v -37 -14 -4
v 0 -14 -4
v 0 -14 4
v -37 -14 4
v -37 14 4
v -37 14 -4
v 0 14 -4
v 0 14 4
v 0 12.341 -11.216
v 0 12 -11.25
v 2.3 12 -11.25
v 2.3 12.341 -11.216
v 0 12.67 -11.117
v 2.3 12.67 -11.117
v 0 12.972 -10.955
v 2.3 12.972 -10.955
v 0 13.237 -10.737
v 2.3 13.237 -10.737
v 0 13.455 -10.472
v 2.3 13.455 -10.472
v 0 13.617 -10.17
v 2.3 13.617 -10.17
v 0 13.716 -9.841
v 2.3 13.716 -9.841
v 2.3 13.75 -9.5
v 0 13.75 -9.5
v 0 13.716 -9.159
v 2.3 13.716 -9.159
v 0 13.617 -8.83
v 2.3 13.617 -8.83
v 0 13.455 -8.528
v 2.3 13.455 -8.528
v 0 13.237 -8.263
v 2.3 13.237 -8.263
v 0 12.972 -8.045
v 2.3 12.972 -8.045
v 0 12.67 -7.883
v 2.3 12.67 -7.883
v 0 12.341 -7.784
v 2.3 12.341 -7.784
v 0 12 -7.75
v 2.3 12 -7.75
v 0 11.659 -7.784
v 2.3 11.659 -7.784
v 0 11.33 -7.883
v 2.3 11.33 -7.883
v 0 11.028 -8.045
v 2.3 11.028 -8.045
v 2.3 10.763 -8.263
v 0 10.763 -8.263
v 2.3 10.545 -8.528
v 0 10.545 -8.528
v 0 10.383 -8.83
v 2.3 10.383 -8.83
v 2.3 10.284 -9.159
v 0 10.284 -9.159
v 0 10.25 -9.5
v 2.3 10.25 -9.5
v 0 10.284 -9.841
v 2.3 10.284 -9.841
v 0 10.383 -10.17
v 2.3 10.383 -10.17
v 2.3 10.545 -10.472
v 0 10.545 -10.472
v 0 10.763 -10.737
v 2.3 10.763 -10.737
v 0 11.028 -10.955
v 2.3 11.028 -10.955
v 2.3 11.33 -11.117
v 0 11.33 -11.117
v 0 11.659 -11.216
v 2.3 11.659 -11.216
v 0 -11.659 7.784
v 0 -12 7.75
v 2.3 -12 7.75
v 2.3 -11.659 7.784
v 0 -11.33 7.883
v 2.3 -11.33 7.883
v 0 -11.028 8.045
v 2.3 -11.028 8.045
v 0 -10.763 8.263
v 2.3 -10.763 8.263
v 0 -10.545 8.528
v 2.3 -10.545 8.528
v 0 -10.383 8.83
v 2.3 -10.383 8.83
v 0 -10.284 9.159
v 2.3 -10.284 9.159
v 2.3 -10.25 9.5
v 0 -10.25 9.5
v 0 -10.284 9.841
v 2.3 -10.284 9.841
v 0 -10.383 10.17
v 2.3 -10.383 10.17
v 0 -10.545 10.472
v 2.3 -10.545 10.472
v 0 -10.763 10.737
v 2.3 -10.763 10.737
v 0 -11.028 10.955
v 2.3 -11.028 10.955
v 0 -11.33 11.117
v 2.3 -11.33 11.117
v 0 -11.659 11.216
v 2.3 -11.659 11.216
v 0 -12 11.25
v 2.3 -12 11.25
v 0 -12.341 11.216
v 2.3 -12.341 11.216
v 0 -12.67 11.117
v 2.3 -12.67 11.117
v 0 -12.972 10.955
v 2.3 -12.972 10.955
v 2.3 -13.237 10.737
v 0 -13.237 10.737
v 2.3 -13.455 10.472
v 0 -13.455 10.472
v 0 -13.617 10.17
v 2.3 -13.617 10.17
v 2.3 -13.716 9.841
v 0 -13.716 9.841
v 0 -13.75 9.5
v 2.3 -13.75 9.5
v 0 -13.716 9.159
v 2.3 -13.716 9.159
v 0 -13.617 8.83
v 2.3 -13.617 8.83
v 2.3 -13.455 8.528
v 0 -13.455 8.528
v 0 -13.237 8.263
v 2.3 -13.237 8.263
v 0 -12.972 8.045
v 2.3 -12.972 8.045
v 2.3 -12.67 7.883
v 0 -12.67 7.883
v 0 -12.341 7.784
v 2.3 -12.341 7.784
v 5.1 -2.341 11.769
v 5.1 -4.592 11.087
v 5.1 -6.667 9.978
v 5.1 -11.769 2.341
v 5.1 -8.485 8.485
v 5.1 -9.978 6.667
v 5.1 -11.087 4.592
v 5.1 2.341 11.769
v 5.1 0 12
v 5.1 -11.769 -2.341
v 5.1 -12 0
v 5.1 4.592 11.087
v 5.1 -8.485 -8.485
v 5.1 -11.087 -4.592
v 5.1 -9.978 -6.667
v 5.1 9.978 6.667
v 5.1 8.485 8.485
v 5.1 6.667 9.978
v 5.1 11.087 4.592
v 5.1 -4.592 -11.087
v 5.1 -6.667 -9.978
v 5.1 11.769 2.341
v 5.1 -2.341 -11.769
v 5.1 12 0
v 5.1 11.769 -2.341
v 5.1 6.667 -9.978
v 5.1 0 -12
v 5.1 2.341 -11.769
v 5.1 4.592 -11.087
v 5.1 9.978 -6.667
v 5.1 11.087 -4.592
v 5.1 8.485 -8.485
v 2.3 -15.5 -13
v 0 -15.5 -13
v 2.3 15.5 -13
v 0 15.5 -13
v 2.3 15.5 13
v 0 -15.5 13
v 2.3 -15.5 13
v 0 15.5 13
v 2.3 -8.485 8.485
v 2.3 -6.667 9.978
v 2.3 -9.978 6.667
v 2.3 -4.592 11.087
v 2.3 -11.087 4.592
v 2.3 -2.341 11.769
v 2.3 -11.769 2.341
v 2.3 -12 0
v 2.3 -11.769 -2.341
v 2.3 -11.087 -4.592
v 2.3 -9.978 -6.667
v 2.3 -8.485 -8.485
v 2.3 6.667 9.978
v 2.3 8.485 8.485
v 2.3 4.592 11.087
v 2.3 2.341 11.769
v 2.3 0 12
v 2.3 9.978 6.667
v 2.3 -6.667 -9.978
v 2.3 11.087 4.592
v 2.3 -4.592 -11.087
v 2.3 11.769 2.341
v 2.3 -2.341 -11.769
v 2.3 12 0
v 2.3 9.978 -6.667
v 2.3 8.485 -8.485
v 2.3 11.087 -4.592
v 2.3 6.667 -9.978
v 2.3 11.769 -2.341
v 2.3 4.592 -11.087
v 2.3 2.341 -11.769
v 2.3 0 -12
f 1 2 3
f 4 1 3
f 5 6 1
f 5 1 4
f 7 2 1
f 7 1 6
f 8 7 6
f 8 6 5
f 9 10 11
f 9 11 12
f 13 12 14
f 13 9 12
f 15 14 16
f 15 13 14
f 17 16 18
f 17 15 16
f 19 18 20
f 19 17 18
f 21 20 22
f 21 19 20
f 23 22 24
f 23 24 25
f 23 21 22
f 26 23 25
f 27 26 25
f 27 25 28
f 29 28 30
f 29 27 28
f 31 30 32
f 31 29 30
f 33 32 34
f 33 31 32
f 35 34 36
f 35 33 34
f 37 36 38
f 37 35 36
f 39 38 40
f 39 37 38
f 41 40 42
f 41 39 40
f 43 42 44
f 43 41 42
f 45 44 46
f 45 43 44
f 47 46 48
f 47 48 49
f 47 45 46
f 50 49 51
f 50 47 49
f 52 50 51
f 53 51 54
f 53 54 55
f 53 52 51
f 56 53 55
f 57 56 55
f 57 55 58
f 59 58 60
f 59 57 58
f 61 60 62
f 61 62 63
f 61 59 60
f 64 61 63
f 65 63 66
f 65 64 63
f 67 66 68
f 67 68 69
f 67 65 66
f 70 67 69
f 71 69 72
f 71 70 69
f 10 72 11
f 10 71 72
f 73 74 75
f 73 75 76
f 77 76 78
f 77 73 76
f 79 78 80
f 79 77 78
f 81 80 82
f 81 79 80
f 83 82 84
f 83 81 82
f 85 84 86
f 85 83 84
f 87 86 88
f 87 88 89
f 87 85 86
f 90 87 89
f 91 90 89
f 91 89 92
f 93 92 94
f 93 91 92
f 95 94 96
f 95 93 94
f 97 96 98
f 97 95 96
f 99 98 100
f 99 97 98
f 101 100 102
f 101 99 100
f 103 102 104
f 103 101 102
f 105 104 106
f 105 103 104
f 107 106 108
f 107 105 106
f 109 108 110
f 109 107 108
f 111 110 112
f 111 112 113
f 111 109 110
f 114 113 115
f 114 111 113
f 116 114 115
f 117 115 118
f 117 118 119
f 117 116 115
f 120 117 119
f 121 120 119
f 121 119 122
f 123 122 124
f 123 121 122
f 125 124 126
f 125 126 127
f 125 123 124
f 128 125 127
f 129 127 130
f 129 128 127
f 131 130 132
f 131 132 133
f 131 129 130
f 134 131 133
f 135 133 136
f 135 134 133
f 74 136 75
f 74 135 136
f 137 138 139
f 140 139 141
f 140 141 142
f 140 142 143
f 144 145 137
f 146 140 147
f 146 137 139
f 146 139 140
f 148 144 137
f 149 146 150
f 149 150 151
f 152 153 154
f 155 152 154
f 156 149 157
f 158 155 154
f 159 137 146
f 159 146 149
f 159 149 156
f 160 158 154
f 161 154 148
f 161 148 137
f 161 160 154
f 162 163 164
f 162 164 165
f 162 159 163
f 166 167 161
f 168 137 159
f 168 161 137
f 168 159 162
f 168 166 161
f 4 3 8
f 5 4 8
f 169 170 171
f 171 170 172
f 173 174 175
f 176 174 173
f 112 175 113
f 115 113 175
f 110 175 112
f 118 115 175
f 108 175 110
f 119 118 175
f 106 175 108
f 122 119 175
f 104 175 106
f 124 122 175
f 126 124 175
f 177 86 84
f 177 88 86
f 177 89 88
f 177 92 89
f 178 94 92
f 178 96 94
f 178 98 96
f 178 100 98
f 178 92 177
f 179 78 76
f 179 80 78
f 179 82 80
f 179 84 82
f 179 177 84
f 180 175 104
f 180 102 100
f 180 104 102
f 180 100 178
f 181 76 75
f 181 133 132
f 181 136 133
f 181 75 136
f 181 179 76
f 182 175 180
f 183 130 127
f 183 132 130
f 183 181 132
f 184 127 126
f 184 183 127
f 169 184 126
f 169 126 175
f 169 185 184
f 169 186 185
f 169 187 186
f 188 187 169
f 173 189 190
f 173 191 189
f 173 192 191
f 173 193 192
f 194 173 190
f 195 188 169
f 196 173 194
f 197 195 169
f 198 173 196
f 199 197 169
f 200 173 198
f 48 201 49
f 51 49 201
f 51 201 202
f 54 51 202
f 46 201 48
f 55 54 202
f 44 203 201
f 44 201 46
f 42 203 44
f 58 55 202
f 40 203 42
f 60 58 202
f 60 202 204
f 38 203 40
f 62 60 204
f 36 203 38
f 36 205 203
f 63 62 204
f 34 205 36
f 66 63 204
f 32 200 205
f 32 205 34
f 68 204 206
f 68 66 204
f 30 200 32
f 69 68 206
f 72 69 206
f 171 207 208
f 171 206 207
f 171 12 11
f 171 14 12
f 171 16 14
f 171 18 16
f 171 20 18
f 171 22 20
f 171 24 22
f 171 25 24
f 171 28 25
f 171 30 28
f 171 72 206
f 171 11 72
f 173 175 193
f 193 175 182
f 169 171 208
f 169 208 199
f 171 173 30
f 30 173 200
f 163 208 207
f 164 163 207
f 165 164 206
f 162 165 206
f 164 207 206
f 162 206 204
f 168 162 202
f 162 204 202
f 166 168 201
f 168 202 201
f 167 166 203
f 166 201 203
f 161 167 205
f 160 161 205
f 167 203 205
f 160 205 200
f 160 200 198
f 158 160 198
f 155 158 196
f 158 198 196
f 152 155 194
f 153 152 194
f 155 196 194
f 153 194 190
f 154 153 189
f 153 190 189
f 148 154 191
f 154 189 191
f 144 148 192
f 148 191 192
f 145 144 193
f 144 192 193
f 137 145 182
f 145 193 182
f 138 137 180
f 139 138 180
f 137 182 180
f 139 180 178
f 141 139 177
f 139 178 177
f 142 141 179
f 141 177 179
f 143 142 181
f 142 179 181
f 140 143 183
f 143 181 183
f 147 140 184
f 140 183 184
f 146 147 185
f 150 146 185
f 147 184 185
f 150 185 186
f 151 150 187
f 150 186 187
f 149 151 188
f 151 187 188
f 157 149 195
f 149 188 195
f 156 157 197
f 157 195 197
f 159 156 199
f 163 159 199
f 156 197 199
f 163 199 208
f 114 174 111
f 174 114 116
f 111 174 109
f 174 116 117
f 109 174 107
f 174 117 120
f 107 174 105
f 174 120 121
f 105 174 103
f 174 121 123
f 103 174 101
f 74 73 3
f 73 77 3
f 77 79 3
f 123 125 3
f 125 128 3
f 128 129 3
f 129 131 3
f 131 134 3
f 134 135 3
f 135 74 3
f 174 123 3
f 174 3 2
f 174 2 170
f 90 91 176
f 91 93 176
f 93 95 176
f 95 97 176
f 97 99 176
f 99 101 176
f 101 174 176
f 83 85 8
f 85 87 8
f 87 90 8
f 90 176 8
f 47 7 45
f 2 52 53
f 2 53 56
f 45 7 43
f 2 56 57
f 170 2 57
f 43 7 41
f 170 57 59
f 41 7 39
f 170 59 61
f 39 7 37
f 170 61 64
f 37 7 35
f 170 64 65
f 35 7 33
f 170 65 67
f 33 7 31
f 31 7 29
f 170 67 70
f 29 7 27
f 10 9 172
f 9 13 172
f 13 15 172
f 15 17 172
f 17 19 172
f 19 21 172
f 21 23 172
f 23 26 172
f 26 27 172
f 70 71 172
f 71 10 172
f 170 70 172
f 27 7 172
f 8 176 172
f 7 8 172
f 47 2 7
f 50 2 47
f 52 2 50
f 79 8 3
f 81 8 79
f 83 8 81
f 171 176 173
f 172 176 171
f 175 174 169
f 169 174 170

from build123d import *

# Parameters (mm, degrees)
SKETCH2_W           = 26
SKETCH2_H           = 31
SKETCH2_R           = 1.75
BOSS_EXTRUDE1_DEPTH = 2.3
SKETCH3_R           = 12
BOSS_EXTRUDE2_DEPTH = 2.8
SKETCH4_W           = 8
SKETCH4_H           = 28
BOSS_EXTRUDE3_DEPTH = 37


with BuildPart() as part:
    # Sketch2 → Boss-Extrude1 (new body)
    with BuildSketch(Plane(origin=(0, 0, 0), x_dir=(0, 0, -1), z_dir=(1, 0, 0))):
        Rectangle(SKETCH2_W, SKETCH2_H)
        with Locations((-9.5, -12)):
            Circle(SKETCH2_R, mode=Mode.SUBTRACT)
        with Locations((9.5, 12)):
            Circle(SKETCH2_R, mode=Mode.SUBTRACT)
    extrude(amount=BOSS_EXTRUDE1_DEPTH)

    # Sketch3 → Boss-Extrude2 (add)
    with BuildSketch(Plane(origin=(2.3, 0, 0), x_dir=(0, 0, -1), z_dir=(1, 0, 0))):
        Circle(SKETCH3_R)
    extrude(amount=BOSS_EXTRUDE2_DEPTH)

    # Sketch4 → Boss-Extrude3 (add)
    with BuildSketch(Plane.ZY):
        Rectangle(SKETCH4_W, SKETCH4_H)
    extrude(amount=BOSS_EXTRUDE3_DEPTH)


solid = part.part
